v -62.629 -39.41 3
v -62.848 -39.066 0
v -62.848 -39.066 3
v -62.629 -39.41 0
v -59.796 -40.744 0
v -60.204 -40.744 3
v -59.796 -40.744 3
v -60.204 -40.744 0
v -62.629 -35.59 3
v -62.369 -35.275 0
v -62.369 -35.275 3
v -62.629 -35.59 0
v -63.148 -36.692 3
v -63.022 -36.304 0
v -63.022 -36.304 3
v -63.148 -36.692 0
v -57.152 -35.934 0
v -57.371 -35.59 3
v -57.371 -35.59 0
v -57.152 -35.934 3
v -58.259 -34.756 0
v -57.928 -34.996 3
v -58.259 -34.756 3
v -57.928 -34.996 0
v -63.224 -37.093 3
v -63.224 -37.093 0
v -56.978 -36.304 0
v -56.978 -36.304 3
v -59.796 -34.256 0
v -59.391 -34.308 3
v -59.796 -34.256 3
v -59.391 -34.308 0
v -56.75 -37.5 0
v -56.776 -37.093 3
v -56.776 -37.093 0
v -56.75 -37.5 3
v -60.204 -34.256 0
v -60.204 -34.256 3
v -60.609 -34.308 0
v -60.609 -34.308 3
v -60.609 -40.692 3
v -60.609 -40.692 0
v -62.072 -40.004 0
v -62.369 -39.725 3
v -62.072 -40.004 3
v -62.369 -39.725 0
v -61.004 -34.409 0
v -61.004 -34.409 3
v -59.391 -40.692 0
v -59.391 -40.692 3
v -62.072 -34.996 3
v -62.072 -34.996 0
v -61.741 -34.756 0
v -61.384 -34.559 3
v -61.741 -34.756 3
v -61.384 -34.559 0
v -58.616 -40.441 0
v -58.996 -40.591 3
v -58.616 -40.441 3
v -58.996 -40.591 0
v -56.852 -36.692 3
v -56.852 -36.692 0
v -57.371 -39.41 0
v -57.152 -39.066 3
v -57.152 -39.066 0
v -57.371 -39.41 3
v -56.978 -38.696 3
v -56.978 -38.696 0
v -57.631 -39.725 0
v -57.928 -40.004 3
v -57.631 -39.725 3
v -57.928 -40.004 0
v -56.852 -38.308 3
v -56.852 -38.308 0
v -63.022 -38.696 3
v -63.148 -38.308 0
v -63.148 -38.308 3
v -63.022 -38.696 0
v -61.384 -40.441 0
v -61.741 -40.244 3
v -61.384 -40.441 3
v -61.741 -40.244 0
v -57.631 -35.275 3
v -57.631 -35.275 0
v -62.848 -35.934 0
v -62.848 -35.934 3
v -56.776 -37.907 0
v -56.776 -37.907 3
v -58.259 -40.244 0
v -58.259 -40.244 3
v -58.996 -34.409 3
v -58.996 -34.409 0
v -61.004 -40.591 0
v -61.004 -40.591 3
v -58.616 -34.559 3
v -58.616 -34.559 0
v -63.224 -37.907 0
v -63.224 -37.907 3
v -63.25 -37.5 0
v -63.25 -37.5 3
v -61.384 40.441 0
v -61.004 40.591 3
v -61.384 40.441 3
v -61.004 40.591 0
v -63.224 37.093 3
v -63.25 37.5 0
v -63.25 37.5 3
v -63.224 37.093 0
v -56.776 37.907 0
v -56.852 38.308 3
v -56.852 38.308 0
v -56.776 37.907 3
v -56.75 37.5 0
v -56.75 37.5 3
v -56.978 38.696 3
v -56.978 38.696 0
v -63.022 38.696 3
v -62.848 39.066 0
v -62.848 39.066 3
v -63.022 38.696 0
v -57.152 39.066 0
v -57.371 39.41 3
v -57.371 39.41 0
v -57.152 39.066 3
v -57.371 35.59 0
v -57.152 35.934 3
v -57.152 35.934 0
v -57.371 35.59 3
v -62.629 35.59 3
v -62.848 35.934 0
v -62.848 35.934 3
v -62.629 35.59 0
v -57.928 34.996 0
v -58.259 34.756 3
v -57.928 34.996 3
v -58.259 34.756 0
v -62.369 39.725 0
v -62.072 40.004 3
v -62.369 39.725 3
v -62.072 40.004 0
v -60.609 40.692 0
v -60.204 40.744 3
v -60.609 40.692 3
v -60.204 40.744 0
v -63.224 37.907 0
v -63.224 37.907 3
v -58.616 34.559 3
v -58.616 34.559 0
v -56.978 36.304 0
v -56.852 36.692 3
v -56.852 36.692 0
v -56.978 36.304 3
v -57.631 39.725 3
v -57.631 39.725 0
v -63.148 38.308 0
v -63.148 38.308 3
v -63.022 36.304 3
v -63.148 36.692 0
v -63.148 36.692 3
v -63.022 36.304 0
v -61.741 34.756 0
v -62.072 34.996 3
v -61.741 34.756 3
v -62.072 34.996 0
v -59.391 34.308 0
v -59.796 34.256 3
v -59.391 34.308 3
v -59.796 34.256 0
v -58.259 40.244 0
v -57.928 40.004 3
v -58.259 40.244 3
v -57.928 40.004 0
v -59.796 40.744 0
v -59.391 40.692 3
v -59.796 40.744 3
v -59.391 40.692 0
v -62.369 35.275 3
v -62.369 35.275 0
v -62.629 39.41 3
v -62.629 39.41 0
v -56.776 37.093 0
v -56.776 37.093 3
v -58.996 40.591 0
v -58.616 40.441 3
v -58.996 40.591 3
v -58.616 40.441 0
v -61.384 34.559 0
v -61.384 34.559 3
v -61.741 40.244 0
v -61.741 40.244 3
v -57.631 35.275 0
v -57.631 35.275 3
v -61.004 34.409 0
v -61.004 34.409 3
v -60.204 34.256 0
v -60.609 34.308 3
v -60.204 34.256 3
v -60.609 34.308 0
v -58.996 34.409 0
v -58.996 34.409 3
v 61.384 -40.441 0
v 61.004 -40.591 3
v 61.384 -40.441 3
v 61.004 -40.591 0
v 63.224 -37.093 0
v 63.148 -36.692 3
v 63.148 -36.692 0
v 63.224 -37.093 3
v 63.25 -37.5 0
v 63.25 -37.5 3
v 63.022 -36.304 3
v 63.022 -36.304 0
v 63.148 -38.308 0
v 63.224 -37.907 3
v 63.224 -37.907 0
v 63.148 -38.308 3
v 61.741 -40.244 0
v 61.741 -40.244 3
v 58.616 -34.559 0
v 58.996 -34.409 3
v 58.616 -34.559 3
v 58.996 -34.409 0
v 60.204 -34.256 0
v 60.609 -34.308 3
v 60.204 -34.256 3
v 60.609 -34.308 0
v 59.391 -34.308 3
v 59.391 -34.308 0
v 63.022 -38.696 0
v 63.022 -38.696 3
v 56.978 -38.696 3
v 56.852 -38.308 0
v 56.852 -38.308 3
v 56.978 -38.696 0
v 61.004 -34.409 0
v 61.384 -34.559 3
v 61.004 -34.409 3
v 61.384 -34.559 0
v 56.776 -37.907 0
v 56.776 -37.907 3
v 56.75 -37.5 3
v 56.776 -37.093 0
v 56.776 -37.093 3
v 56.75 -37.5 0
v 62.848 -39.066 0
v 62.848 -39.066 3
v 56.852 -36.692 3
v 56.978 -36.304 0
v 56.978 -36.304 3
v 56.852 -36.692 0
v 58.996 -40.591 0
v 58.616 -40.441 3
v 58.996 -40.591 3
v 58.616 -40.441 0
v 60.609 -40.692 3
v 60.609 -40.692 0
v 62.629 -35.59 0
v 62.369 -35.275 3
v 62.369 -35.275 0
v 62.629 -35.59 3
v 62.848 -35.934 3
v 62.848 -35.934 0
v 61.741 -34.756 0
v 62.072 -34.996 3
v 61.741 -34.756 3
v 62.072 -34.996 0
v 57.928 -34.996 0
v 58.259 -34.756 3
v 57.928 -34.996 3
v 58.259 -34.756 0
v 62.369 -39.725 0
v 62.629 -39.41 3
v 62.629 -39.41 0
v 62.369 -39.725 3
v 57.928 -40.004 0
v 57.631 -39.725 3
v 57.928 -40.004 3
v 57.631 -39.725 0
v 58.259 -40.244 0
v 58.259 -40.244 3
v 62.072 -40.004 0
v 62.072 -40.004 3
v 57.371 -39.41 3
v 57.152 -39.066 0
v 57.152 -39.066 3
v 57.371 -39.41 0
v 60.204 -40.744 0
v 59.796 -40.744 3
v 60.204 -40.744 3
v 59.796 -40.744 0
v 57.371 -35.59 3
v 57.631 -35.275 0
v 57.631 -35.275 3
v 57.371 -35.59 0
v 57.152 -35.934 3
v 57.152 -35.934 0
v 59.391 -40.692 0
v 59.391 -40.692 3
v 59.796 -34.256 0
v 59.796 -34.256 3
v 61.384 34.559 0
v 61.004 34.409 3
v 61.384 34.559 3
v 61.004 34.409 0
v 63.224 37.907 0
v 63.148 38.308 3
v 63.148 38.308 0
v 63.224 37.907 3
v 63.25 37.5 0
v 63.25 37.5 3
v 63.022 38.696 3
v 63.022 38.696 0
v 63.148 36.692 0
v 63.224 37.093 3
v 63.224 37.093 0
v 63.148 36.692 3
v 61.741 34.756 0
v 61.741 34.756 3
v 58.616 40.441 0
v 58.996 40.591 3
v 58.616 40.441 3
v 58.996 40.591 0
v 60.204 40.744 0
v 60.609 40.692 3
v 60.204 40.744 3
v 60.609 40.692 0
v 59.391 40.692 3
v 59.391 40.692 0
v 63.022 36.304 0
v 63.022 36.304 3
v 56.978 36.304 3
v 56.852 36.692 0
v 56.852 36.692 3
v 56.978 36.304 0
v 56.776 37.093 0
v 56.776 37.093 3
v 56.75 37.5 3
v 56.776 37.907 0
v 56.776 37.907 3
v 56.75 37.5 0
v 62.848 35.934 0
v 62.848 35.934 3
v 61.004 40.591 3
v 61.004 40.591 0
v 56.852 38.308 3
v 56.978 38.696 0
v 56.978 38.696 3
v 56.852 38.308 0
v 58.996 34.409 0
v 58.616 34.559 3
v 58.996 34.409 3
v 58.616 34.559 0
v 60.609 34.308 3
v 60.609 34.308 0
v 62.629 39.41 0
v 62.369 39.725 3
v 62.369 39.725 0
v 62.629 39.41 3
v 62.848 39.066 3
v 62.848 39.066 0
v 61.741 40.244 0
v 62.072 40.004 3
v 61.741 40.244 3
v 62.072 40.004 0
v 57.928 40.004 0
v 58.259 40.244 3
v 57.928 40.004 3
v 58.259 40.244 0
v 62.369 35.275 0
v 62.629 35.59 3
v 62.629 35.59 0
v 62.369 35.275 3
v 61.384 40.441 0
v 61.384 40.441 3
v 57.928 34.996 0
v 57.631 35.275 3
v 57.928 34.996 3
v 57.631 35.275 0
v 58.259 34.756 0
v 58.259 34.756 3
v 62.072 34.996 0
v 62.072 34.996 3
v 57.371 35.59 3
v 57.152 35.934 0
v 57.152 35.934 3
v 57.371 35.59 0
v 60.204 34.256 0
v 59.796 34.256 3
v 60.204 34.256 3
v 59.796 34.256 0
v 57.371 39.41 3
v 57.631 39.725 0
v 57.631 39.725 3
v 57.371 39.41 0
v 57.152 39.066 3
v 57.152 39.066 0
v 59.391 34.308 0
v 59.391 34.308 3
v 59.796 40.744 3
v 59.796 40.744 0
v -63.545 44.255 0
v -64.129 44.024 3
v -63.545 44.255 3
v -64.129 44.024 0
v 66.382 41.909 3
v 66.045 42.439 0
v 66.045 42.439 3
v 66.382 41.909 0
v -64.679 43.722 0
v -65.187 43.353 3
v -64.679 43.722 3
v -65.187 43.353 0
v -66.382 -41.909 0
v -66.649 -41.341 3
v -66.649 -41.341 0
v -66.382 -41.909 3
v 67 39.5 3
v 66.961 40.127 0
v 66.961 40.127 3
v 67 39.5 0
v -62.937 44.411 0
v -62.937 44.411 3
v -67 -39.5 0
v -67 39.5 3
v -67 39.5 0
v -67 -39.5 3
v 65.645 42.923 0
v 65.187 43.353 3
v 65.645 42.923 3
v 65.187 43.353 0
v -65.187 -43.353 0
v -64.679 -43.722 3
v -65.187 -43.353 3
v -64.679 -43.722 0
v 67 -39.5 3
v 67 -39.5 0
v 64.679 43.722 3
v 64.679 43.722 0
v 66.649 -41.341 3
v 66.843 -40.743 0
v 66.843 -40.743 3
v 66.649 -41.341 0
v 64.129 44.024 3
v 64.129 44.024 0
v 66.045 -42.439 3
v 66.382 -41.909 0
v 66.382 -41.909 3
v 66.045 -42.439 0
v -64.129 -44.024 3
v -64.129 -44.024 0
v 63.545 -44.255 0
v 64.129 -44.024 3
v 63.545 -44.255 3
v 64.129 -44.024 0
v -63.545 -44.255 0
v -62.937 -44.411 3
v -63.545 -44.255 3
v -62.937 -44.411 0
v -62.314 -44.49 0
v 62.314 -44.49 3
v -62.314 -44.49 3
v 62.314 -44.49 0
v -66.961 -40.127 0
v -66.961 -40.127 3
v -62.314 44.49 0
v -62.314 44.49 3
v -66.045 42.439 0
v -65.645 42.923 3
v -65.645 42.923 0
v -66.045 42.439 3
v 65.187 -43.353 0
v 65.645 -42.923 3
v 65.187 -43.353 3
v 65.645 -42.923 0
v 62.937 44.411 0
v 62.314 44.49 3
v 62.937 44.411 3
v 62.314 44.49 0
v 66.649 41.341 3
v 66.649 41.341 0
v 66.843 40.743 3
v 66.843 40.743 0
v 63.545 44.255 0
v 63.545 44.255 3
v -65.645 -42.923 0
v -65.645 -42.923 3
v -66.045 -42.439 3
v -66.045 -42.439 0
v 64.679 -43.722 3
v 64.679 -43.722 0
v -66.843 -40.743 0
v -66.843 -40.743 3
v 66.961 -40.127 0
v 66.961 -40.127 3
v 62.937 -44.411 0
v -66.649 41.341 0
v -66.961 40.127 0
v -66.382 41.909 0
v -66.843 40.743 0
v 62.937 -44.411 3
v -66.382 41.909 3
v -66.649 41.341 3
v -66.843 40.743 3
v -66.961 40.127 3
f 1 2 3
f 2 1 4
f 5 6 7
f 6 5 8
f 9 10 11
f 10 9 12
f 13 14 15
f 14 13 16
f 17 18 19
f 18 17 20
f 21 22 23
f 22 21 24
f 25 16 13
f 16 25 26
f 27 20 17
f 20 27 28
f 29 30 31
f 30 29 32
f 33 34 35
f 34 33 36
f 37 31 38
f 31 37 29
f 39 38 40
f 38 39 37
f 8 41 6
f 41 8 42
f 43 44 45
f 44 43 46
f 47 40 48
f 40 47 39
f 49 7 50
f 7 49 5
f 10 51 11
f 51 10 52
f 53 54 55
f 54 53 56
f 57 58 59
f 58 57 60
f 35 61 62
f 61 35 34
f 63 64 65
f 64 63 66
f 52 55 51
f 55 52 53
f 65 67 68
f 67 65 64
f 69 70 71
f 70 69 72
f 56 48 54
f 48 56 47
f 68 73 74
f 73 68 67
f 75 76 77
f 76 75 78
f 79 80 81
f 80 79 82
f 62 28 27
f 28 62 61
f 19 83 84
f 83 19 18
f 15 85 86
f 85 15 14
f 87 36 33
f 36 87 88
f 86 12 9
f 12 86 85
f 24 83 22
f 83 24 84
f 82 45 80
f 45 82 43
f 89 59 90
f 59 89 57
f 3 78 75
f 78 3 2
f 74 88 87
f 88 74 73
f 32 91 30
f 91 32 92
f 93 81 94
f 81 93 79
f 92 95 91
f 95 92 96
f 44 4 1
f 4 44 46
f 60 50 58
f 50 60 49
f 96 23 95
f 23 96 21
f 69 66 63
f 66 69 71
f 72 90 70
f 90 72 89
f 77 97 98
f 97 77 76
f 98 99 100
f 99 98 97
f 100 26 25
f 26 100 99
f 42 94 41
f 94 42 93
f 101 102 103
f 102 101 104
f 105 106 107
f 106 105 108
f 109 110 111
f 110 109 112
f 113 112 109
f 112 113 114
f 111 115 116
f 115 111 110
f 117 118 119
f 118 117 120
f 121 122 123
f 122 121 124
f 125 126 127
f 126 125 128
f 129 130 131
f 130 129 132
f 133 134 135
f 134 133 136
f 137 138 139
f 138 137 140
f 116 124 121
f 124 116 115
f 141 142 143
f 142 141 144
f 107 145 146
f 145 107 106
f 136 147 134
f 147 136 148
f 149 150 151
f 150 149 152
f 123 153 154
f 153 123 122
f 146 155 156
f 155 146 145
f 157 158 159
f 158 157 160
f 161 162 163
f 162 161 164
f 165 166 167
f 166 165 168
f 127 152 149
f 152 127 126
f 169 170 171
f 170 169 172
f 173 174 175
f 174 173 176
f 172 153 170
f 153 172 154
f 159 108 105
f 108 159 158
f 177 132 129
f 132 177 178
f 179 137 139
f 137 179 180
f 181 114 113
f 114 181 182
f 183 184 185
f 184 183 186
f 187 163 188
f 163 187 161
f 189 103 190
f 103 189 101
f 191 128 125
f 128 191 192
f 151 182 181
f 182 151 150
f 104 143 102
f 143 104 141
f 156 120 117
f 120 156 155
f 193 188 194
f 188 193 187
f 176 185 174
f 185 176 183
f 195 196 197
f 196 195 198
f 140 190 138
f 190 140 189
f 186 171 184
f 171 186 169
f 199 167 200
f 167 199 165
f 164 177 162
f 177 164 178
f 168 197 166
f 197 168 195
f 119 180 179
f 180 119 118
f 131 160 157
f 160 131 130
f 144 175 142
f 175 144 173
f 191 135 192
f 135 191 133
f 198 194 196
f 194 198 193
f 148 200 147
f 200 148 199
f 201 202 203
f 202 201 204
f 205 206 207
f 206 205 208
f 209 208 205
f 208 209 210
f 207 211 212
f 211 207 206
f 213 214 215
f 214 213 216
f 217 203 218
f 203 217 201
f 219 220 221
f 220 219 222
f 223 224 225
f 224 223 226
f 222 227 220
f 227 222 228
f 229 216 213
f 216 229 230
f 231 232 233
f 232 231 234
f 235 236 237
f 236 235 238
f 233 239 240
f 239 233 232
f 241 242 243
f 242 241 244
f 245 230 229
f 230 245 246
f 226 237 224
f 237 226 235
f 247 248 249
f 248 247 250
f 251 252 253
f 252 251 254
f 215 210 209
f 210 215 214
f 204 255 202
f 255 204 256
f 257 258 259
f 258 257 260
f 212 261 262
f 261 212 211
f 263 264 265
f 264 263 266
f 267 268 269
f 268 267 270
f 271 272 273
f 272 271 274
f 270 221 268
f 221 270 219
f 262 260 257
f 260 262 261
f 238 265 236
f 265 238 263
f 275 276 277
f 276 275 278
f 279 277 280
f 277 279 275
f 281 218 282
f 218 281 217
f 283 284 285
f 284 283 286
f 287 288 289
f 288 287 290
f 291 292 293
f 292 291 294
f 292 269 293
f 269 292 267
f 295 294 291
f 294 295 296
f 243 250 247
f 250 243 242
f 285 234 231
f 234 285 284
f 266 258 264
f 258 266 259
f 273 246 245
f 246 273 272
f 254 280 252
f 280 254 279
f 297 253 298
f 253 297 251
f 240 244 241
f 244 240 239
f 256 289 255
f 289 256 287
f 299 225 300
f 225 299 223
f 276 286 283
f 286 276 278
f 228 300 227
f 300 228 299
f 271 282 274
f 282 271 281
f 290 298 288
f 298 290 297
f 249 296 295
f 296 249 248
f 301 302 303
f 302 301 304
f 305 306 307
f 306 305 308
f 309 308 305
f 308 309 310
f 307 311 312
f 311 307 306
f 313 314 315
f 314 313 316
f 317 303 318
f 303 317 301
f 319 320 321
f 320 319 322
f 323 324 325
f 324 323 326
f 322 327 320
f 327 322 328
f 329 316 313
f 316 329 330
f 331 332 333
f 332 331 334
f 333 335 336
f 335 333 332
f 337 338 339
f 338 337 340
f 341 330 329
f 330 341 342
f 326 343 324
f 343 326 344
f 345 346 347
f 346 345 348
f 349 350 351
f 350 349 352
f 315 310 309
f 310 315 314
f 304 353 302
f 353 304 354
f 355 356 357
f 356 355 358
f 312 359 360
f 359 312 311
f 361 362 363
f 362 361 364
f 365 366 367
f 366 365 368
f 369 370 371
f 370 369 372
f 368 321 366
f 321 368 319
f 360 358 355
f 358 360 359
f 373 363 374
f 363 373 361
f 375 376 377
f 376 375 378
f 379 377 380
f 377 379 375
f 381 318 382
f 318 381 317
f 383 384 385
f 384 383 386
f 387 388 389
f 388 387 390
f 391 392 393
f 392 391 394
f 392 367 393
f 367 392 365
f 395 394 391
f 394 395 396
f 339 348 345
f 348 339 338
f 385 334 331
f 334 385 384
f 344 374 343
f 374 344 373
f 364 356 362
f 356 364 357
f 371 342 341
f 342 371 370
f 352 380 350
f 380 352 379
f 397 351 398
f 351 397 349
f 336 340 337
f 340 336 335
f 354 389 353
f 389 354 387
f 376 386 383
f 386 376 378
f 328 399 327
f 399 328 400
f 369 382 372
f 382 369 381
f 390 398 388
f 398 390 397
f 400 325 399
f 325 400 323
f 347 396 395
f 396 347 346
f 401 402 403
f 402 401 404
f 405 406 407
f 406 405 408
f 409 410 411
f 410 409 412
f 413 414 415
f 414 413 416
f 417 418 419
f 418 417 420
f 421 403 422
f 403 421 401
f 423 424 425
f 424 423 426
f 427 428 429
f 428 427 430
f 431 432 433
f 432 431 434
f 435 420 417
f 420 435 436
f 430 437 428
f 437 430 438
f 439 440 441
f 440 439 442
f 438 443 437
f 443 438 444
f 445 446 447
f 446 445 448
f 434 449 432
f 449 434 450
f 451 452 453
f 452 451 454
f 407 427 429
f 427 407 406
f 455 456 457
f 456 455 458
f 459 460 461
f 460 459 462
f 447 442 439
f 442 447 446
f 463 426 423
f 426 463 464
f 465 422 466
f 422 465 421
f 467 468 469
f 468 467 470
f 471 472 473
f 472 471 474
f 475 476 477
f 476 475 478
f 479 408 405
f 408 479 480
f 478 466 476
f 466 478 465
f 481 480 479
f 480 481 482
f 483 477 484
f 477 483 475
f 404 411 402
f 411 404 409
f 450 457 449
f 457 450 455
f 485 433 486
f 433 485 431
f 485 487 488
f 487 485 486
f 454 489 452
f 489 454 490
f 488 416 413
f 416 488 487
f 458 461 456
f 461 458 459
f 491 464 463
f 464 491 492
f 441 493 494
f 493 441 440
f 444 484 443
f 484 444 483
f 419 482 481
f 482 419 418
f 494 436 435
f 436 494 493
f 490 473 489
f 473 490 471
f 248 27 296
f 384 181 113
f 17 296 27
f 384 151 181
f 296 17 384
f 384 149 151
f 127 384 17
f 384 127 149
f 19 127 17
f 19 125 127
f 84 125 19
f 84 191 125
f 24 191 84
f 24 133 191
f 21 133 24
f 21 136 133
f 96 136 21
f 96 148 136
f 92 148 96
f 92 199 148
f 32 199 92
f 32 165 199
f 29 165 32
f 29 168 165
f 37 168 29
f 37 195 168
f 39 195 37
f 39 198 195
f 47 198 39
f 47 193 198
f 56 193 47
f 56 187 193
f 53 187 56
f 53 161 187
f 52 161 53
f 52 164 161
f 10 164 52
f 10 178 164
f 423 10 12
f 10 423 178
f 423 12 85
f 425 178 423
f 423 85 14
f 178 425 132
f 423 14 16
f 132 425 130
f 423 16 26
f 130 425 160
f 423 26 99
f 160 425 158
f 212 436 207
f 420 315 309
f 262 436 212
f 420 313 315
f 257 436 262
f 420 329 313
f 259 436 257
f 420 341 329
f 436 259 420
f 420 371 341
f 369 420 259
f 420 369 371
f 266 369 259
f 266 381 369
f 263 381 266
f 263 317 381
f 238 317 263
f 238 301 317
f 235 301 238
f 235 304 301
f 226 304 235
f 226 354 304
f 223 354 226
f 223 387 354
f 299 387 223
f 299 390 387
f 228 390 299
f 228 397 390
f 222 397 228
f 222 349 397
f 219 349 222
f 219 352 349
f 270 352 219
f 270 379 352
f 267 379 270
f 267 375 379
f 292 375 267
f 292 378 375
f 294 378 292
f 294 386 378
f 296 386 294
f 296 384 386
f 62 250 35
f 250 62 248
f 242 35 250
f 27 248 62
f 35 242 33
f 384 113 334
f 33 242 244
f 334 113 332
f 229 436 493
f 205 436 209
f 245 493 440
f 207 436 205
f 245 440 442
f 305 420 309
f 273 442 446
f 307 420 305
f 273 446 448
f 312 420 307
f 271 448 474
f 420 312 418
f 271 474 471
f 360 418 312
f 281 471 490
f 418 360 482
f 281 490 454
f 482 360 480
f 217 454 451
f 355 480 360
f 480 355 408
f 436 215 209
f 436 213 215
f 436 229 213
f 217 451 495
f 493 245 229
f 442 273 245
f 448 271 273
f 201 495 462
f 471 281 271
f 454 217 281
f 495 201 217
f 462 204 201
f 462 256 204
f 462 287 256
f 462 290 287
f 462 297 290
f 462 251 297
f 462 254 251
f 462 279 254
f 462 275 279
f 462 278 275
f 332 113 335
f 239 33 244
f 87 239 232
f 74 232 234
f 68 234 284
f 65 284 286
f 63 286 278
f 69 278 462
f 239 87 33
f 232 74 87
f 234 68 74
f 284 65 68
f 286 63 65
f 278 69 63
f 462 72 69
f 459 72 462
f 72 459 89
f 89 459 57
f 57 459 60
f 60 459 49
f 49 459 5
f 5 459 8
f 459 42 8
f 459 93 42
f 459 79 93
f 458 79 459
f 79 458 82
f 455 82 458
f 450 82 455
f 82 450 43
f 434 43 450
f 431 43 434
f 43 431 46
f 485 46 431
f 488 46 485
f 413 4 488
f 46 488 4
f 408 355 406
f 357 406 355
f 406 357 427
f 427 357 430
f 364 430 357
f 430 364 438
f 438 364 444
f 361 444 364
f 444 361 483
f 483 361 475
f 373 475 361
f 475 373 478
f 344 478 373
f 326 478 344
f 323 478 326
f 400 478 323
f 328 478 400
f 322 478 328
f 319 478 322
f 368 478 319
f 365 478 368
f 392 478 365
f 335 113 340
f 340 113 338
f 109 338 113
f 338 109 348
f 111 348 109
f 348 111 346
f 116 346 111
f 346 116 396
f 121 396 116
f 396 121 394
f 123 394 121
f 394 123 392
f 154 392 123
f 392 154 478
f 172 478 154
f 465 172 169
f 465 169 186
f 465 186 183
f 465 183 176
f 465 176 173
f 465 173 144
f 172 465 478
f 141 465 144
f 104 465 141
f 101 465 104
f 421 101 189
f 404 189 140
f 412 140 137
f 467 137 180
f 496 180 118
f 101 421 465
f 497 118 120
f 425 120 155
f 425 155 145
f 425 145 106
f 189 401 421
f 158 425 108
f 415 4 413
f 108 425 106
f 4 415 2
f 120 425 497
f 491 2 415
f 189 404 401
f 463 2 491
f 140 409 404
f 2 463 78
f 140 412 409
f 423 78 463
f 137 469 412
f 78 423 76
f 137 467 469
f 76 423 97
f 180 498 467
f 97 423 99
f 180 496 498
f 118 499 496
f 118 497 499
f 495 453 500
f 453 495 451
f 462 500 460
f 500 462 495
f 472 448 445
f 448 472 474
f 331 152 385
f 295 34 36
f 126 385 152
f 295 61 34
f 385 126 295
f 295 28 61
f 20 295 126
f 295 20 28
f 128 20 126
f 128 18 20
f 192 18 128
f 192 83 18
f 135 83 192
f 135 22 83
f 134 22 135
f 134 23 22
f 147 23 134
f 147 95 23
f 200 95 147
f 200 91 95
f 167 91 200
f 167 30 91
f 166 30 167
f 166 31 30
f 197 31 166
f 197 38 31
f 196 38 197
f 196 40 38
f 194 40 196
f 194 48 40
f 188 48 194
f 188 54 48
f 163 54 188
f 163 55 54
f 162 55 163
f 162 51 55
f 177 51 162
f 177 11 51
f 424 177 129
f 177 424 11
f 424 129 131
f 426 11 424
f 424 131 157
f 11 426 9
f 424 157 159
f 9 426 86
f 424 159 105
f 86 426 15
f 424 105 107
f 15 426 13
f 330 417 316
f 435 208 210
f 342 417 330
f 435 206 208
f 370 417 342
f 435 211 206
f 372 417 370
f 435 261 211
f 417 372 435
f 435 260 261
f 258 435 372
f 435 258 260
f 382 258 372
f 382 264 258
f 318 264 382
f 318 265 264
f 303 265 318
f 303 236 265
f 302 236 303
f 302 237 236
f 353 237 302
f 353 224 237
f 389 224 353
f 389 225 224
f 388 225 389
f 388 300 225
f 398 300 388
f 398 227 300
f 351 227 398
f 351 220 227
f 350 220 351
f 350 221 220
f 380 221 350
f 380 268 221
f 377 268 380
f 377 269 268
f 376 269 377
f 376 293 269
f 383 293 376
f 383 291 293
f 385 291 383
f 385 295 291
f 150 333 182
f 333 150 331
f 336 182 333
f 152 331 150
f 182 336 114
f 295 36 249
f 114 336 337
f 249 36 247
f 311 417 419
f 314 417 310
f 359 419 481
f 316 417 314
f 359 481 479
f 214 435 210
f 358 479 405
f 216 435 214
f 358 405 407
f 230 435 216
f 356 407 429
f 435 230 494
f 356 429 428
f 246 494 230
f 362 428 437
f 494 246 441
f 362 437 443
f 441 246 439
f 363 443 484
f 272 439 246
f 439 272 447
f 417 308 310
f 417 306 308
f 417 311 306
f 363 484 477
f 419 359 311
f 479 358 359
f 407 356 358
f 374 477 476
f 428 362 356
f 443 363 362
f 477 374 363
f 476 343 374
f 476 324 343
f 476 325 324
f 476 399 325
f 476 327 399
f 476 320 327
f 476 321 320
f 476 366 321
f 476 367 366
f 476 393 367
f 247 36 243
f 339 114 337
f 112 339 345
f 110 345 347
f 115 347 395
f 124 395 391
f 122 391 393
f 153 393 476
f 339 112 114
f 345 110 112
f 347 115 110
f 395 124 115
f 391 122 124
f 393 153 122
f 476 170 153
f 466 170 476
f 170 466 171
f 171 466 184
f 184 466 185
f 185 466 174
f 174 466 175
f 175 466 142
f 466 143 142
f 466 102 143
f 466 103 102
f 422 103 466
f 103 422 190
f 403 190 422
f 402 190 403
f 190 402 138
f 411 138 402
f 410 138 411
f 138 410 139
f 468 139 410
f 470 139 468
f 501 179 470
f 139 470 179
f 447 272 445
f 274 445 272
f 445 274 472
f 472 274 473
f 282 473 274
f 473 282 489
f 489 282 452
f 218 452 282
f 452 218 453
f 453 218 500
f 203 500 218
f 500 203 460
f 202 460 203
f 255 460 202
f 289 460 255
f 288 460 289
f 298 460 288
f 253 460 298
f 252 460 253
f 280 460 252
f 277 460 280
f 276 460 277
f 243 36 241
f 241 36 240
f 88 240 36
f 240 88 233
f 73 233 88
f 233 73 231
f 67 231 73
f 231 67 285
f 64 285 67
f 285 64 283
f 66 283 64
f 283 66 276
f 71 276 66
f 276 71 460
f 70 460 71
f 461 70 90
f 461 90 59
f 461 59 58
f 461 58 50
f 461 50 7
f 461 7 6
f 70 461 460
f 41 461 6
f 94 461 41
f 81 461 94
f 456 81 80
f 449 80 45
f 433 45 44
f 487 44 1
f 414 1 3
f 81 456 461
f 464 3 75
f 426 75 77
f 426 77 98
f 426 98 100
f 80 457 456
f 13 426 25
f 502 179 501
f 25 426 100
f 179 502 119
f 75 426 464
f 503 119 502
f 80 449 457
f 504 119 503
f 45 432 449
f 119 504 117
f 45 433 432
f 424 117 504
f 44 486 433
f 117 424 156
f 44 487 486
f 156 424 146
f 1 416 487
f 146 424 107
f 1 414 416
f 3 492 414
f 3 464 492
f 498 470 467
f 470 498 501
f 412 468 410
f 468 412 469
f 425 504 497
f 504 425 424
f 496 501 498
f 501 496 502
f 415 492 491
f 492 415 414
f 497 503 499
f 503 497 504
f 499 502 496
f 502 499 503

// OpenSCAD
$fn = 50;


difference() {
	union() {
		hull() {
			translate(v = [-62.0000000000, 39.5000000000, 0]) {
				cylinder(h = 3, r = 5);
			}
			translate(v = [62.0000000000, 39.5000000000, 0]) {
				cylinder(h = 3, r = 5);
			}
			translate(v = [-62.0000000000, -39.5000000000, 0]) {
				cylinder(h = 3, r = 5);
			}
			translate(v = [62.0000000000, -39.5000000000, 0]) {
				cylinder(h = 3, r = 5);
			}
		}
	}
	union() {
		translate(v = [-60.0000000000, -37.5000000000, -100.0000000000]) {
			cylinder(h = 200, r = 3.2500000000);
		}
		translate(v = [-60.0000000000, 37.5000000000, -100.0000000000]) {
			cylinder(h = 200, r = 3.2500000000);
		}
		translate(v = [60.0000000000, -37.5000000000, -100.0000000000]) {
			cylinder(h = 200, r = 3.2500000000);
		}
		translate(v = [60.0000000000, 37.5000000000, -100.0000000000]) {
			cylinder(h = 200, r = 3.2500000000);
		}
	}
}
